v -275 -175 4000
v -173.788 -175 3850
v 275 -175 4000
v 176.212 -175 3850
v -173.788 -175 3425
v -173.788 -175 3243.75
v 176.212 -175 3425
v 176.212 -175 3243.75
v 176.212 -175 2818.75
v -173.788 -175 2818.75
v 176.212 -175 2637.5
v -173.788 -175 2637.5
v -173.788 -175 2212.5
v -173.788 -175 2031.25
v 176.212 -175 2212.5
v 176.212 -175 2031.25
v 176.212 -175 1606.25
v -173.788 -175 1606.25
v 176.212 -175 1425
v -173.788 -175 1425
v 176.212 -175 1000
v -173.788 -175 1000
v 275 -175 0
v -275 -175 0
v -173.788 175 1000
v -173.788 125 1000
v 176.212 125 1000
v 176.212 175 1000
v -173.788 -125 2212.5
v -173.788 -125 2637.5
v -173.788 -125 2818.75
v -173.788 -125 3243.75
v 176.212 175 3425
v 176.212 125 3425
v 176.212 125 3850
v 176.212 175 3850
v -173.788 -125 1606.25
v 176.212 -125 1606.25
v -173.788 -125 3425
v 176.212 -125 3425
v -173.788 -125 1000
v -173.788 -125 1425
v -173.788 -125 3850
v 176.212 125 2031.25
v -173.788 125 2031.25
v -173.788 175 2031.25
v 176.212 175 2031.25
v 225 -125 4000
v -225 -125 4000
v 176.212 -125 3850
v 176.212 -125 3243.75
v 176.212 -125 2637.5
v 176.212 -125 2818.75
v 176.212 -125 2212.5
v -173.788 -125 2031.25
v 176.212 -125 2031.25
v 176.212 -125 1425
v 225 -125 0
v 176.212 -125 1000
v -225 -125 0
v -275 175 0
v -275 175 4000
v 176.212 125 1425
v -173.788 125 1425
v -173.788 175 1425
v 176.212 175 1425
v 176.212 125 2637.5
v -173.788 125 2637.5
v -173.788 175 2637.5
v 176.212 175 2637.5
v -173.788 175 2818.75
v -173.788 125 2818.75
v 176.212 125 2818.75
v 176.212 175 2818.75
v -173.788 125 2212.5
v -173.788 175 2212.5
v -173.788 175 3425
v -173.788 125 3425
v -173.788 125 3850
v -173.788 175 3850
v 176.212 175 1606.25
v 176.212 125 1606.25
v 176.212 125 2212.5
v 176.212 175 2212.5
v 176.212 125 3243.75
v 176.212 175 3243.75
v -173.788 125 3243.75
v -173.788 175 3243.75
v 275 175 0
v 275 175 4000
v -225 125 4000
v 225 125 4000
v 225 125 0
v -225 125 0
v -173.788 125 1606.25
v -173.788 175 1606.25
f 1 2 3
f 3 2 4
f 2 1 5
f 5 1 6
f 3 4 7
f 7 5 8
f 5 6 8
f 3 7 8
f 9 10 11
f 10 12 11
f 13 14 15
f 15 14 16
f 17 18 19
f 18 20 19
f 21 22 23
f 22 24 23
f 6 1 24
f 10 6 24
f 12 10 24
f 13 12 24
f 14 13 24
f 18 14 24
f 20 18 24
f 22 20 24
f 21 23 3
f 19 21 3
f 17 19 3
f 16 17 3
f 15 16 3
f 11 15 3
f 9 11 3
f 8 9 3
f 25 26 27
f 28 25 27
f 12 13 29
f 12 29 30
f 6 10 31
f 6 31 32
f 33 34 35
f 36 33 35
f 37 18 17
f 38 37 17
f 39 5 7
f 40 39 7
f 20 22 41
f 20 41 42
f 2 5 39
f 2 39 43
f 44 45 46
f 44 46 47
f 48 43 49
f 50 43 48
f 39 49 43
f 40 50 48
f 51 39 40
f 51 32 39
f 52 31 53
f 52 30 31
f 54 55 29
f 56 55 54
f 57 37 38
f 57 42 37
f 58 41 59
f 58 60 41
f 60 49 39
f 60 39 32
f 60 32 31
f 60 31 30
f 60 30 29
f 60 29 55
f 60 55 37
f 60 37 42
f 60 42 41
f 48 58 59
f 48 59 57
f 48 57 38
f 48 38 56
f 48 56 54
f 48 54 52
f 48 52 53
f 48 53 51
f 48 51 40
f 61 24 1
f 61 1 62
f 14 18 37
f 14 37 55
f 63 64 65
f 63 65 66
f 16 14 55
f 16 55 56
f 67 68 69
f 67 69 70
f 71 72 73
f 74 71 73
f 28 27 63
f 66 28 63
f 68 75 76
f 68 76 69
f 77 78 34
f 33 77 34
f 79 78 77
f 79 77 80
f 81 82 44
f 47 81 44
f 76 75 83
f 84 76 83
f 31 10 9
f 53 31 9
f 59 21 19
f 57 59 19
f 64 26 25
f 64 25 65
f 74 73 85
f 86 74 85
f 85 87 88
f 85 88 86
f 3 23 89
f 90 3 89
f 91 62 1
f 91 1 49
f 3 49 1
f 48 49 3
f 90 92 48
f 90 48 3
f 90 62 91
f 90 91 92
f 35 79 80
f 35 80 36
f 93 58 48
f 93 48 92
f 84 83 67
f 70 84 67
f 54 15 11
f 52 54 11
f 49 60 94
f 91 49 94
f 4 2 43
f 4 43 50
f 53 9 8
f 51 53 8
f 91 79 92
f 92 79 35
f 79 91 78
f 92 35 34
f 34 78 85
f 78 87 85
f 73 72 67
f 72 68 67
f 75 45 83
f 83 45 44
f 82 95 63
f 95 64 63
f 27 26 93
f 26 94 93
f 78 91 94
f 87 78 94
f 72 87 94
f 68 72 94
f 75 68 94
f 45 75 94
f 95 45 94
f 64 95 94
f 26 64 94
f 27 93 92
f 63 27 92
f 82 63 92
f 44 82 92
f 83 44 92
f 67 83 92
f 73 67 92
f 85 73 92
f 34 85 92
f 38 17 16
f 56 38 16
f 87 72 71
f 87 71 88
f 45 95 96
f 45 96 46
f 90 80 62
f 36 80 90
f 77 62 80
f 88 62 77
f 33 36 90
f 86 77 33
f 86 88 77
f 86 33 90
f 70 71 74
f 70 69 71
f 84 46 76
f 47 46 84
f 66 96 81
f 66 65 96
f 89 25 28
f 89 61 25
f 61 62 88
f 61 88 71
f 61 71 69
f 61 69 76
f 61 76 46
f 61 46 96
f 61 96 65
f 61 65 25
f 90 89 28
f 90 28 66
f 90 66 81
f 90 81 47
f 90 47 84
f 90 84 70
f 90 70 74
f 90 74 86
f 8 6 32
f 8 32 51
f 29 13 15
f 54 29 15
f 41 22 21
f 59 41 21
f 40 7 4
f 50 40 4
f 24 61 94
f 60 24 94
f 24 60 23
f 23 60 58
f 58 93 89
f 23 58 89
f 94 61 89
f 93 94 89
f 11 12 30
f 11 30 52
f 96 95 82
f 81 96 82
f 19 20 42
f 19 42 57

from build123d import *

# Parameters (mm, degrees)
DWIRE_W             = 550
DWIRE_H             = 350
PAD001_DEPTH        = 4000
SKETCH_W            = 450
SKETCH_H            = 250
POCKET_DEPTH        = 4000
SKETCH001_W         = 350
SKETCH001_H         = 425
POCKET001_DEPTH     = 3500
LINEARPATTERN_COUNT = 5
LINEARPATTERN_PITCH = 606.25


with BuildPart() as part:
    # DWire → Pad001 (new body)
    with BuildSketch(Plane.XY):
        Rectangle(DWIRE_W, DWIRE_H)
    extrude(amount=PAD001_DEPTH)

    # Sketch → Pocket (cut)
    with BuildSketch(Plane.XY):
        Rectangle(SKETCH_W, SKETCH_H)
    extrude(amount=POCKET_DEPTH, mode=Mode.SUBTRACT)

    # Sketch001 (on Face6 of Pocket) → Pocket001 (cut)
    with BuildSketch(Plane.XZ.offset(175)):
        with Locations((1.211661, 1212.5)):
            Rectangle(SKETCH001_W, SKETCH001_H)
    pocket001 = extrude(amount=-POCKET001_DEPTH, mode=Mode.SUBTRACT)

    # LinearPattern: Pocket001 ×5
    with Locations(*[(0, 0, i * LINEARPATTERN_PITCH) for i in range(1, LINEARPATTERN_COUNT)]):
        add(pocket001, mode=Mode.SUBTRACT)


solid = part.part
